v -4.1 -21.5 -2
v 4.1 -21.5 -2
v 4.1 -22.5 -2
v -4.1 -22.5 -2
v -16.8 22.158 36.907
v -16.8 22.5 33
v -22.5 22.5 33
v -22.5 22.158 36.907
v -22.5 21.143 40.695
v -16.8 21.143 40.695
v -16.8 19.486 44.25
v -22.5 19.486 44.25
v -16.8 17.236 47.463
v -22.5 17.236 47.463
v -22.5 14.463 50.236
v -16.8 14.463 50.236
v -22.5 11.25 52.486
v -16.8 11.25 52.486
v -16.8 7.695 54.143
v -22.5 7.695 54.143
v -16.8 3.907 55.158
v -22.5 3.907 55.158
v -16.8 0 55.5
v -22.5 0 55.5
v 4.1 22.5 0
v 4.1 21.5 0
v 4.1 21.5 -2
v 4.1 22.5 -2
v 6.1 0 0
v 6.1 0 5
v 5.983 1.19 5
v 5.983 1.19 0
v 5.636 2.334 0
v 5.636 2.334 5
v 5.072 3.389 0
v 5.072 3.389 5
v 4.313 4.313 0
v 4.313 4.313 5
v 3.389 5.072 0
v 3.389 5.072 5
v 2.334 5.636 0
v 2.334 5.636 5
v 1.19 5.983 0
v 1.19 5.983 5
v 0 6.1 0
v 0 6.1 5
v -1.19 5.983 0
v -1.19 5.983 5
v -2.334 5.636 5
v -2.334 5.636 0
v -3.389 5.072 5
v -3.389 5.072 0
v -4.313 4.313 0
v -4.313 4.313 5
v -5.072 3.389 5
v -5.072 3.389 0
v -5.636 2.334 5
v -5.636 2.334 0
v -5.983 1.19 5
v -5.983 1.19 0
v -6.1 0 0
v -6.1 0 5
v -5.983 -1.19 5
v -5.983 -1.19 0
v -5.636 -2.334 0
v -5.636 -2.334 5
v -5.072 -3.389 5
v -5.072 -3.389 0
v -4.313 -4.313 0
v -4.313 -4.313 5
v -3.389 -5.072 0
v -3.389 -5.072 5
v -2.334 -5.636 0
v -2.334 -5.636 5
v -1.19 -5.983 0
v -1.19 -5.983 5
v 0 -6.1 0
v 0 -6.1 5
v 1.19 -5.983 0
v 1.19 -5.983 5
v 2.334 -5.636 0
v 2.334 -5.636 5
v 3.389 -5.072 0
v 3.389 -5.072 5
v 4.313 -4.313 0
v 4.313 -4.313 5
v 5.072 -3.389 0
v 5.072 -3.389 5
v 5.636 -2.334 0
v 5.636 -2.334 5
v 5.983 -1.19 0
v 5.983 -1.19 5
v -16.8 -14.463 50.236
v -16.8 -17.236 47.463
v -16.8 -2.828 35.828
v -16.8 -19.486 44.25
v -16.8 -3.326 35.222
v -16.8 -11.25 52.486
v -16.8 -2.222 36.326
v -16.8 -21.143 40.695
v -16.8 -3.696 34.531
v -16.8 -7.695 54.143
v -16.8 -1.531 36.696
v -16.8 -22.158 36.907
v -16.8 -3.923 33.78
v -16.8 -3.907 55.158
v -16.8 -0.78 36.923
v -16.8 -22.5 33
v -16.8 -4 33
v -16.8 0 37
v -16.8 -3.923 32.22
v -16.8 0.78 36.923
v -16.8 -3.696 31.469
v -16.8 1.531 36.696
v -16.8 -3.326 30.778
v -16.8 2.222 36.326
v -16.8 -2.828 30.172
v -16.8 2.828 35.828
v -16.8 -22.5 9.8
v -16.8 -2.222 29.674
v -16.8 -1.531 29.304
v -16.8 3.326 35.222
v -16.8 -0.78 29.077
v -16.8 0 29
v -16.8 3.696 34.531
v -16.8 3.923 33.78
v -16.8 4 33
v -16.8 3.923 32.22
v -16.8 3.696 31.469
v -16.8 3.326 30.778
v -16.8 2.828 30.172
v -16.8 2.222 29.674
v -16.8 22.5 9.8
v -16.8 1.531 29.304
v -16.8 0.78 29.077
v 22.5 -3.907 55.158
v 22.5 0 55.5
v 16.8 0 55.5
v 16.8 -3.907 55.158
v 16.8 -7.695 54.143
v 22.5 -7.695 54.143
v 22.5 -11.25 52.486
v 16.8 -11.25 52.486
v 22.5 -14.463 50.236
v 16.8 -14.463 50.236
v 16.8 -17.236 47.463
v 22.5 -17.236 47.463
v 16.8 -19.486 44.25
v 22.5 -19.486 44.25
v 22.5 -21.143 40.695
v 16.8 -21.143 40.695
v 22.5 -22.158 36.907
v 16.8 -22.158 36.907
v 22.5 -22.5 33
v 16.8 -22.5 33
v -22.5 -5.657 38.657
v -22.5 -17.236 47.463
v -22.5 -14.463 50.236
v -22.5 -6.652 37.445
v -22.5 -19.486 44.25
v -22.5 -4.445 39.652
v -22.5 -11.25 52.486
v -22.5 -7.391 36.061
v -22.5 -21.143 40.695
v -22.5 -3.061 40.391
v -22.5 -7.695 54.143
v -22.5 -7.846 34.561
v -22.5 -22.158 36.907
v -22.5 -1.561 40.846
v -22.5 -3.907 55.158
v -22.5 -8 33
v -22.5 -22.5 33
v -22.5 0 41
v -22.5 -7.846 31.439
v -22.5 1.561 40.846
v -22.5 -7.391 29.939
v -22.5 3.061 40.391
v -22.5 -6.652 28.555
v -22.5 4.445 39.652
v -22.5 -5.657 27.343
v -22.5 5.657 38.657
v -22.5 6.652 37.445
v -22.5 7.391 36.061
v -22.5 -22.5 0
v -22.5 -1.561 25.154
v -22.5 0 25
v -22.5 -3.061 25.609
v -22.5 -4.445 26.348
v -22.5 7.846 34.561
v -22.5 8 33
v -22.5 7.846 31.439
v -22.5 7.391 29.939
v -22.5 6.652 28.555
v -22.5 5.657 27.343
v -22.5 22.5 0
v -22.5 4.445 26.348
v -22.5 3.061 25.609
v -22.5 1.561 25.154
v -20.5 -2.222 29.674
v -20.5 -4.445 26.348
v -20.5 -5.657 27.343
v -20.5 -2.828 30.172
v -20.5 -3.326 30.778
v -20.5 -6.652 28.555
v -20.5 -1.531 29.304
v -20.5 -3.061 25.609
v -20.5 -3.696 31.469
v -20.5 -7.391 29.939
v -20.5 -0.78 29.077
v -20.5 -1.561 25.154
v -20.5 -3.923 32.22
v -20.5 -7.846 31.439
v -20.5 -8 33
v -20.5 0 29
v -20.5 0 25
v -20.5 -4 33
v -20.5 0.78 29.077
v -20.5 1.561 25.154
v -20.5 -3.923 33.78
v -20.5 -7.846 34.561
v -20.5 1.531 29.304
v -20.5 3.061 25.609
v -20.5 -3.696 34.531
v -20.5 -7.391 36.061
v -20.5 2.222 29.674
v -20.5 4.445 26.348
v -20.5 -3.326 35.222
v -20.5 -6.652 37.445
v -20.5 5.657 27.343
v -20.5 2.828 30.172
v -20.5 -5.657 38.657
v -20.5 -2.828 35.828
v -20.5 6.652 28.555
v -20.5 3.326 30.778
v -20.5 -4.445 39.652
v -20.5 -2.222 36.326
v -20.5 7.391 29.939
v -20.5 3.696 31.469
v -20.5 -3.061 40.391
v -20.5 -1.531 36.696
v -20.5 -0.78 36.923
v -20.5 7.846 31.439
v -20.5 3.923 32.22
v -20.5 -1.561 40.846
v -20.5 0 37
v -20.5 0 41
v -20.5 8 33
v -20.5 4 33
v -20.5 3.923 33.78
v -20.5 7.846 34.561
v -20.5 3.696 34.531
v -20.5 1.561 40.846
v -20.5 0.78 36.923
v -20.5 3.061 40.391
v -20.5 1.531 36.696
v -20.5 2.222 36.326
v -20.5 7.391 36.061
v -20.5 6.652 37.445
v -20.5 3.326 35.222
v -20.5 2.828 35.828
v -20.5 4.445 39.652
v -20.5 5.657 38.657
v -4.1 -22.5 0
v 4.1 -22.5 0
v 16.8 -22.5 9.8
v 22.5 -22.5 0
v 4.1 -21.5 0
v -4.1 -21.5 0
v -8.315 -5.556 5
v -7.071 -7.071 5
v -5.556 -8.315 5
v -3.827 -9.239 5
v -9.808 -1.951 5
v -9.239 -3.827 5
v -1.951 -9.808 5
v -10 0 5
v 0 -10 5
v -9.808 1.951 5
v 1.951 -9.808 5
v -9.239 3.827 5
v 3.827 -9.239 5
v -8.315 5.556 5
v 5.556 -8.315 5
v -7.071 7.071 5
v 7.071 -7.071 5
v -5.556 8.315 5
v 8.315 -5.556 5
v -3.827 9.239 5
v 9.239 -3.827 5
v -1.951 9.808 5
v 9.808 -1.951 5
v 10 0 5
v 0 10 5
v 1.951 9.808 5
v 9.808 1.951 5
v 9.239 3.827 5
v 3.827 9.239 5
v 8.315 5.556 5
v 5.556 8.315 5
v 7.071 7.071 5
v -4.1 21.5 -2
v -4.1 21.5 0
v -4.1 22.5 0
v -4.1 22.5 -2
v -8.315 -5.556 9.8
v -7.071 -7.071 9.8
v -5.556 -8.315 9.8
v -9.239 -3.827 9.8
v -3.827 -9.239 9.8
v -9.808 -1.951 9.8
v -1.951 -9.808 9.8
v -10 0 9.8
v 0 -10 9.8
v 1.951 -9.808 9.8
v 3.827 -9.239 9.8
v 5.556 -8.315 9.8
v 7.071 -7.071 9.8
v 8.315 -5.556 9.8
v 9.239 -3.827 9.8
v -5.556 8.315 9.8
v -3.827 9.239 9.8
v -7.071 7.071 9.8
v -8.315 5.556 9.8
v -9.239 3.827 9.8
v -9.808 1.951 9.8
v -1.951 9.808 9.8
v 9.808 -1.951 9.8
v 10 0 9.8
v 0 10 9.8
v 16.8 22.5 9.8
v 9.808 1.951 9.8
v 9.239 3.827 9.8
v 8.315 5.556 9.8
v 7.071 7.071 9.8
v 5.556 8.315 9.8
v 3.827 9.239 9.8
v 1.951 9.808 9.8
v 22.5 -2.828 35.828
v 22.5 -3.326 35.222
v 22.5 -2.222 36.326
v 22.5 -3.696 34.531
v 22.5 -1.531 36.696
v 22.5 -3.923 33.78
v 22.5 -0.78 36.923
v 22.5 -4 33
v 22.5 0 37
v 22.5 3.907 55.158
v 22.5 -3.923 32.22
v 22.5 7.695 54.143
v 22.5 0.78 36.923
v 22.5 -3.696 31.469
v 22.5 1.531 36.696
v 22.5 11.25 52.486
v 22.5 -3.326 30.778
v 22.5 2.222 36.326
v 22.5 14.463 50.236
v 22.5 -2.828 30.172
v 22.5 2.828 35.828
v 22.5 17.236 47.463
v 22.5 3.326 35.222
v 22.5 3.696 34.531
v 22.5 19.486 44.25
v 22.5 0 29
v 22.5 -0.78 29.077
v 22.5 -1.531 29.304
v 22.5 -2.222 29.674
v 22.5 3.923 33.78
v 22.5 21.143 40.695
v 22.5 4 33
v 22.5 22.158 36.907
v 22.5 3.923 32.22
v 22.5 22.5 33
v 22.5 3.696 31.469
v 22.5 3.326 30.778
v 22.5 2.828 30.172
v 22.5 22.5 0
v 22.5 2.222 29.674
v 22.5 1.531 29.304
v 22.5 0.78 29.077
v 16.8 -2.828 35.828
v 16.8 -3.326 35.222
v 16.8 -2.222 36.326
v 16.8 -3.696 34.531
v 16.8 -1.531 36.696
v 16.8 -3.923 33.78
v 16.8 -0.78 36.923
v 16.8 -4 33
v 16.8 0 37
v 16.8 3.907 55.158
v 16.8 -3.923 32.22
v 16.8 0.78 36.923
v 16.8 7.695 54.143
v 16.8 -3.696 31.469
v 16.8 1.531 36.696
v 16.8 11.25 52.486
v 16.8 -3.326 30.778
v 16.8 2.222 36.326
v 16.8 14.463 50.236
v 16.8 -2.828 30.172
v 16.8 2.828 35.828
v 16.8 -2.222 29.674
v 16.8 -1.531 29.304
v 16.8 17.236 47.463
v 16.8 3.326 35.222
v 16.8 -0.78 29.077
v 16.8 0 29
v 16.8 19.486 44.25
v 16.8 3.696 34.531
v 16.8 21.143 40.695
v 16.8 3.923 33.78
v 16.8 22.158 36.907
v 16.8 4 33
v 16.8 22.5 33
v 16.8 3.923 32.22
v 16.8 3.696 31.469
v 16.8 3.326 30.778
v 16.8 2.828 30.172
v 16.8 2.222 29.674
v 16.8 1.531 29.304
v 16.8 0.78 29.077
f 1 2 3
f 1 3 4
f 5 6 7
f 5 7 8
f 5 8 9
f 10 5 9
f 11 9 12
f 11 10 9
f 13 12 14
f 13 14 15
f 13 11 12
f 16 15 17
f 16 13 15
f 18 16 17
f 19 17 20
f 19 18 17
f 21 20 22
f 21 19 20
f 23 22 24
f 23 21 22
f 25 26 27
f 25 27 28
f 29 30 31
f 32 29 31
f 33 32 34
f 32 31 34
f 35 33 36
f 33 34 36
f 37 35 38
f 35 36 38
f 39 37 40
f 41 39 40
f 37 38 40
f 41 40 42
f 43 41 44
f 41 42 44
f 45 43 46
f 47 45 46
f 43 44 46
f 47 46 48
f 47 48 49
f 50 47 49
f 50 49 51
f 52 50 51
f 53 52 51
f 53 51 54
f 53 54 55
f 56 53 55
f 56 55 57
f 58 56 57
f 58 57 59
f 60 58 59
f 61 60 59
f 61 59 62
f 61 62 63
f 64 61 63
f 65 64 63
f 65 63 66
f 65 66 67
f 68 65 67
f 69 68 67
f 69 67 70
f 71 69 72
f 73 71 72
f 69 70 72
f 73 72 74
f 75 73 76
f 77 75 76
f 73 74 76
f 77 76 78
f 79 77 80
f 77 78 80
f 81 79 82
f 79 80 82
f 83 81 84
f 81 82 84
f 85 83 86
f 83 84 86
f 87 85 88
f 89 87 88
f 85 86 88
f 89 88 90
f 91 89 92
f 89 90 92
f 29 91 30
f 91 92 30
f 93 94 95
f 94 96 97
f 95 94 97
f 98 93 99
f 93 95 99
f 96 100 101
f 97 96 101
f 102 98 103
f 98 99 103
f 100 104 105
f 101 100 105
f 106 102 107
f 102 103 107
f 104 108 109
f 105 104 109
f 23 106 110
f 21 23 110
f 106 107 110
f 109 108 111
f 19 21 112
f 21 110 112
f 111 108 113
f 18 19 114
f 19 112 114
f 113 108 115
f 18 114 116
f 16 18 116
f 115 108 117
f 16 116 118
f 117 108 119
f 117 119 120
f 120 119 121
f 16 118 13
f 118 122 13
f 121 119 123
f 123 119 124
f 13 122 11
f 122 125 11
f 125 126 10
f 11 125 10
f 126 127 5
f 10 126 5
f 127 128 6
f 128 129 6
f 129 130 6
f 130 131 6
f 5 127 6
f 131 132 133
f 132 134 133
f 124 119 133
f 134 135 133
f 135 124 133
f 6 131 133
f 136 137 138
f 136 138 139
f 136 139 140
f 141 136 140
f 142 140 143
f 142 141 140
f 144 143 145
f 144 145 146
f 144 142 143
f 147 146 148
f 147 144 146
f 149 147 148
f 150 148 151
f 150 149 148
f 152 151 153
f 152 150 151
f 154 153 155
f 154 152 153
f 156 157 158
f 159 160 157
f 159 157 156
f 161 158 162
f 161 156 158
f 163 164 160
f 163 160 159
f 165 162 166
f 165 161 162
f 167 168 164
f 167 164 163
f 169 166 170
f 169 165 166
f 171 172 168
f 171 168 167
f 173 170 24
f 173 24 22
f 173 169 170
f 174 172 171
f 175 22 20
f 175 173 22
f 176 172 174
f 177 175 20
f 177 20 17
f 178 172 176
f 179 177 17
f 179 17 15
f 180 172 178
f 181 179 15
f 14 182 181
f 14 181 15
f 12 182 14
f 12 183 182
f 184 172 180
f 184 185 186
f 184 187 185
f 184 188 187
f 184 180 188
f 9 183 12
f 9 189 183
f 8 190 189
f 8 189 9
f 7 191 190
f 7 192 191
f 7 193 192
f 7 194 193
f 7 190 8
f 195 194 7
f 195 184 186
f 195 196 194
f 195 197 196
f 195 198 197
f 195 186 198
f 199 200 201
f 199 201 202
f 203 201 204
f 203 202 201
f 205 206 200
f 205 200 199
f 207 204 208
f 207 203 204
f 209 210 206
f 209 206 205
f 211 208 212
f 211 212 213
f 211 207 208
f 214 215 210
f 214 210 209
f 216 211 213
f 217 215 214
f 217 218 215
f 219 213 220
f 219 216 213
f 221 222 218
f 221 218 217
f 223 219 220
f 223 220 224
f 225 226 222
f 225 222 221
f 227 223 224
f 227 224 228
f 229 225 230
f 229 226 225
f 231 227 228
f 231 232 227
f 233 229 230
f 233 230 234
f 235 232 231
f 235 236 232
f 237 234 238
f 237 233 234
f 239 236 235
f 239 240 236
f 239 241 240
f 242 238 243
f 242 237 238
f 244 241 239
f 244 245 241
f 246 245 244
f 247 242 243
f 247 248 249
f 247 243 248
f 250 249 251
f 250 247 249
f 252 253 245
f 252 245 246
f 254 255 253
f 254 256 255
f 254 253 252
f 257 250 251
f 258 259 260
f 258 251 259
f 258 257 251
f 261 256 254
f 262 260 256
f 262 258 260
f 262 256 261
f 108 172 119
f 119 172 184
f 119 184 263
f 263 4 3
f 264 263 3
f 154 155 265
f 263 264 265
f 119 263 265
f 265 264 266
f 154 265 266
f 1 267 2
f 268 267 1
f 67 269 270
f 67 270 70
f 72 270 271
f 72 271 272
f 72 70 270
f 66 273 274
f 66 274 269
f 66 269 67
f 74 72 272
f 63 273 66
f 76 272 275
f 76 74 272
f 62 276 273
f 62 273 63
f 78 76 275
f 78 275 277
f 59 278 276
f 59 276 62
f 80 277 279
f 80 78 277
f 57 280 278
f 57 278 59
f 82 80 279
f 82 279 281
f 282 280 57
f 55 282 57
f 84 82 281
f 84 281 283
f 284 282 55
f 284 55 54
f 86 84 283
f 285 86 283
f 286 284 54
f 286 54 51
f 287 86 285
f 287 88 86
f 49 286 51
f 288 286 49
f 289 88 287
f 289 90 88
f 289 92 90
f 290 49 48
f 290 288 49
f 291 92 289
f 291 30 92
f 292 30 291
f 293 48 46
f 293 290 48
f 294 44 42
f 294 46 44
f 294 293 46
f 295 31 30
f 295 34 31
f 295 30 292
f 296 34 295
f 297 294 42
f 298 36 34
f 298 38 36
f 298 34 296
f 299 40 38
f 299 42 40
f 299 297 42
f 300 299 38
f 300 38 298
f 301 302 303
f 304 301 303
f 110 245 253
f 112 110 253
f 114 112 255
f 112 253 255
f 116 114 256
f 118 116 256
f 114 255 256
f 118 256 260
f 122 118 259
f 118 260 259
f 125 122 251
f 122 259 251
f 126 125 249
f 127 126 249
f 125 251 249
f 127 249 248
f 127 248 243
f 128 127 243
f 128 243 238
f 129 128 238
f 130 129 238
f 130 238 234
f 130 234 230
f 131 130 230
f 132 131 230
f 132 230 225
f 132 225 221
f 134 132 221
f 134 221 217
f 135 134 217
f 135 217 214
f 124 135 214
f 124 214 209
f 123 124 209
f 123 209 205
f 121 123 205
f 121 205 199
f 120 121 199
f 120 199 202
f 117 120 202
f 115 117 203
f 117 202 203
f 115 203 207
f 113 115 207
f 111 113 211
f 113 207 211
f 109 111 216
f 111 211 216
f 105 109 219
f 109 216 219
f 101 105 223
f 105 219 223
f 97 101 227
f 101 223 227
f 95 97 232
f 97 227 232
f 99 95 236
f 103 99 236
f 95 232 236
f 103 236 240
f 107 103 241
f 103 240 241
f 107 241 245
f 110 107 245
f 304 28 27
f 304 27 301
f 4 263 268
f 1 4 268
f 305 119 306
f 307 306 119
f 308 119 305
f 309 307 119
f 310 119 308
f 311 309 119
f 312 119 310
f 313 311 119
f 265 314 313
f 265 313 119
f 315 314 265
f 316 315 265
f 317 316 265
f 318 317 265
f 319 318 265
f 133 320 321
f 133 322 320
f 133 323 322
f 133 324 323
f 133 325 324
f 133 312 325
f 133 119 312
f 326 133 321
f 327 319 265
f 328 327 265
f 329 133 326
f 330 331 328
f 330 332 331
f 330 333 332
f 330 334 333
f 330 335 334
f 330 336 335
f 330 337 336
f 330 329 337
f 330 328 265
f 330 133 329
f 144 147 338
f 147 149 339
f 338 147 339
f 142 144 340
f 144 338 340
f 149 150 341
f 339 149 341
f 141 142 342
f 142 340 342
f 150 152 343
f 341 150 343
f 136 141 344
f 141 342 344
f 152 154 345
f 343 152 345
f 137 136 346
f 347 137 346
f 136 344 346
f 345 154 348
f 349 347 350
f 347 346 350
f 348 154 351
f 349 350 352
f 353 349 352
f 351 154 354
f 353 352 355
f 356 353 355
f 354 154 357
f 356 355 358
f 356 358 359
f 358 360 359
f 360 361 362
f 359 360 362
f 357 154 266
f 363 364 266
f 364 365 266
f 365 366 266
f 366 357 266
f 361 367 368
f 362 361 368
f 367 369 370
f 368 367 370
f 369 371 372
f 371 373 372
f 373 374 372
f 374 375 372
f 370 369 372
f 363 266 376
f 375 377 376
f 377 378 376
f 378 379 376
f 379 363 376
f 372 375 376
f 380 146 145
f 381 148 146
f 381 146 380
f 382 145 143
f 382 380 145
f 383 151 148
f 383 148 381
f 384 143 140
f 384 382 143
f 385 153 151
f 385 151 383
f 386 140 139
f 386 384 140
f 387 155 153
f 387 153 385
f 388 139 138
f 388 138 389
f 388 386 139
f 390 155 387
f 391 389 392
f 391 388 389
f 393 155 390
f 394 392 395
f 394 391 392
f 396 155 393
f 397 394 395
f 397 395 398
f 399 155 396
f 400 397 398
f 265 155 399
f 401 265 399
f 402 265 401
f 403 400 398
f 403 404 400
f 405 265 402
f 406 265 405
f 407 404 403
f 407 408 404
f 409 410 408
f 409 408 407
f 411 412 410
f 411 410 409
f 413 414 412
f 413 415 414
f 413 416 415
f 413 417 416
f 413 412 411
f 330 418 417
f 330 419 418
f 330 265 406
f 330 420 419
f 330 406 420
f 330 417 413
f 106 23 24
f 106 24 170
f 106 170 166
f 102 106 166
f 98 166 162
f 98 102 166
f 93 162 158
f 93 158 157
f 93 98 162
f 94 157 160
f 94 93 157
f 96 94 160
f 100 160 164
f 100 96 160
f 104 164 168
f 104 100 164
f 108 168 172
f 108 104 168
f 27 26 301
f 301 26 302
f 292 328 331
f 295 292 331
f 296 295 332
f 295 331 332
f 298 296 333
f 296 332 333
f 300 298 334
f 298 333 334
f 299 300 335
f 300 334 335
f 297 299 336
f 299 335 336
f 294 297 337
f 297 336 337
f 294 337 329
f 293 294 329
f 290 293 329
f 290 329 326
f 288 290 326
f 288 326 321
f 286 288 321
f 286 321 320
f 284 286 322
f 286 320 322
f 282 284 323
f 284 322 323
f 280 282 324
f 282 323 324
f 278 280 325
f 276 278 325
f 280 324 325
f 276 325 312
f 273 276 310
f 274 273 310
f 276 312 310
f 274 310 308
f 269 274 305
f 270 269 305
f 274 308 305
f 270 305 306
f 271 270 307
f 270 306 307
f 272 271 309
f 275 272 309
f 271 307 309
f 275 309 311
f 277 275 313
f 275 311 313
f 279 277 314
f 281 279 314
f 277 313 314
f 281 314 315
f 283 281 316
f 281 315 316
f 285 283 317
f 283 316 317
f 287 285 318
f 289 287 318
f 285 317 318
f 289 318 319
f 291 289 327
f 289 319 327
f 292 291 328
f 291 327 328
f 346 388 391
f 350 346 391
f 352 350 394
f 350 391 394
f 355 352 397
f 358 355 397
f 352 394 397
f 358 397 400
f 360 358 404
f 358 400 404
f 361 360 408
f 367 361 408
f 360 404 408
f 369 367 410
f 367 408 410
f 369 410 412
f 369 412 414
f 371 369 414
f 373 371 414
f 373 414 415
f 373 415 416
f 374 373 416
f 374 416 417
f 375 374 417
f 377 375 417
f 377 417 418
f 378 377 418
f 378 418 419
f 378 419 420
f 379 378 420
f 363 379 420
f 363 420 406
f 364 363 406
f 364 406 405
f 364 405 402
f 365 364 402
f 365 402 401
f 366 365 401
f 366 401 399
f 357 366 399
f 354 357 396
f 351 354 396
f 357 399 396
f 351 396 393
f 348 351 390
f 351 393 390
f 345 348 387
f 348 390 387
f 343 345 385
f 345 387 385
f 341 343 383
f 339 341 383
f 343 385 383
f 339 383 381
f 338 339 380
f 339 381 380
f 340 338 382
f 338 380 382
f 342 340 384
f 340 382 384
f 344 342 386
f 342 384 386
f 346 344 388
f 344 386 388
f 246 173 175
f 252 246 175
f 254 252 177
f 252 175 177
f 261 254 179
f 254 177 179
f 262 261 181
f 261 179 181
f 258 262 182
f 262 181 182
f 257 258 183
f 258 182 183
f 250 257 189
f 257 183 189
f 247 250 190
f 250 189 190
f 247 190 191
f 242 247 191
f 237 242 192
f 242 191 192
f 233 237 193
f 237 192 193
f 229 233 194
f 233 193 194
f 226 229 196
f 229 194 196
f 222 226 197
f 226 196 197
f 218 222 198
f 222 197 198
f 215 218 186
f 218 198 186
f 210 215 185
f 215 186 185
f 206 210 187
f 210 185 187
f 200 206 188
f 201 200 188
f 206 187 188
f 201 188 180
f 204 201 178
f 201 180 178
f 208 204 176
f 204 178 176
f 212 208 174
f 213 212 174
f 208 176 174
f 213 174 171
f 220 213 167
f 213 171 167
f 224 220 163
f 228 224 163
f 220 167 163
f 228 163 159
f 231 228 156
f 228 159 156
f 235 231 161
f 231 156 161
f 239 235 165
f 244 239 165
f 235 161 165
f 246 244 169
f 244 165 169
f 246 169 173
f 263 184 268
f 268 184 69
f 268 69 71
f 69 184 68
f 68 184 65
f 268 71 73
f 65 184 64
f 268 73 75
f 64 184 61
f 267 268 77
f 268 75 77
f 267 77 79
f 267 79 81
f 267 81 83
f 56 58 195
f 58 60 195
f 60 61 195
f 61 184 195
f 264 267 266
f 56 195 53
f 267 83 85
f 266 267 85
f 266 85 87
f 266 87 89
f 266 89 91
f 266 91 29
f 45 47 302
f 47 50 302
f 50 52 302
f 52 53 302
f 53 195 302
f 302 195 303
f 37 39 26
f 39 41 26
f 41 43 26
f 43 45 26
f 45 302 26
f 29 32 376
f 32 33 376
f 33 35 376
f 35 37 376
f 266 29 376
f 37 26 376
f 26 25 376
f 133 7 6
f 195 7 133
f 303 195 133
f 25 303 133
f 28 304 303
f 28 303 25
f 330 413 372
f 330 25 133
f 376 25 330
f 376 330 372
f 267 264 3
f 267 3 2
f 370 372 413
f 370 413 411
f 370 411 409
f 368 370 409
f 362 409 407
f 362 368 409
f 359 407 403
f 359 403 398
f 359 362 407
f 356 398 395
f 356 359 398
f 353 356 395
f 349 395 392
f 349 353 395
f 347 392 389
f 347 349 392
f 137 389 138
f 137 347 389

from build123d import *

# Parameters (mm, degrees)
SKETCH_1_W          = 45
SKETCH_1_H          = 45
EXTRUDE_1_DEPTH     = 9.8
SKETCH_2_W          = 5.7
SKETCH_2_H          = 45
EXTRUDE_2_DEPTH     = 45.7
CUT_EXTRUDE_START   = -45
CUT_EXTRUDE_2_DEPTH = 45
SKETCH_4_R          = 4
CUT_EXTRUDE_3_DEPTH = 75.909945935
SKETCH_5_R          = 8
CUT_EXTRUDE_4_DEPTH = 2
SKETCH_6_R          = 6.1
CUT_EXTRUDE_5_DEPTH = 56.686533381
SKETCH_7_W          = 8.2
SKETCH_7_H          = 1
EXTRUDE_3_DEPTH     = 2
SKETCH_8_R          = 10
CUT_EXTRUDE_6_DEPTH = 4.8


# Read off the part's stored shape, not the designer's step: 切除-拉伸2
with BuildPart() as part:
    # 草图1 → 凸台-拉伸1 (new body)
    with BuildSketch(Plane.XY):
        Rectangle(SKETCH_1_W, SKETCH_1_H)
    extrude(amount=EXTRUDE_1_DEPTH)

    # 草图2 → 凸台-拉伸2 (add)
    with BuildSketch(Plane.XY.offset(9.8)):
        with Locations((-19.65, 0)):
            Rectangle(SKETCH_2_W, SKETCH_2_H)
        with Locations((19.65, 0)):
            Rectangle(SKETCH_2_W, SKETCH_2_H)
    extrude(amount=EXTRUDE_2_DEPTH)

    # 切除-拉伸2 outline → 切除-拉伸2 (cut)
    with BuildSketch(Plane.ZY.offset(22.5).offset(CUT_EXTRUDE_START)):
        with BuildLine():
            Line((55.5, 22.5), (33, 22.5))
            ThreePointArc((33, 22.5), (48.909902577, 15.909902577), (55.5, 0))
            Line((55.5, 0), (55.5, 22.5))
        make_face()
        with BuildLine():
            Line((55.5, -22.5), (55.5, 0))
            ThreePointArc((55.5, 0), (48.909902577, -15.909902577), (33, -22.5))
            Line((33, -22.5), (55.5, -22.5))
        make_face()
    extrude(amount=CUT_EXTRUDE_2_DEPTH, mode=Mode.SUBTRACT)

    # 草图4 → 切除-拉伸3 (cut, through all)
    with BuildSketch(Plane.ZY.offset(22.5)):
        with Locations((33, 0)):
            Circle(SKETCH_4_R)
    extrude(amount=-CUT_EXTRUDE_3_DEPTH, mode=Mode.SUBTRACT)

    # 草图5 → 切除-拉伸4 (cut)
    with BuildSketch(Plane.ZY.offset(22.5)):
        with Locations((33, 0)):
            Circle(SKETCH_5_R)
    extrude(amount=-CUT_EXTRUDE_4_DEPTH, mode=Mode.SUBTRACT)

    # 草图6 → 切除-拉伸5 (cut, through all)
    with BuildSketch(Plane.XY.offset(9.8)):
        Circle(SKETCH_6_R)
    extrude(amount=-CUT_EXTRUDE_5_DEPTH, mode=Mode.SUBTRACT)

    # 草图7 → 凸台-拉伸3 (add)
    with BuildSketch(Plane(origin=(0, 0, 0), x_dir=(-1, 0, 0), z_dir=(0, 0, -1))):
        with Locations((0, 22)):
            Rectangle(SKETCH_7_W, SKETCH_7_H)
        with Locations((0, -22)):
            Rectangle(SKETCH_7_W, SKETCH_7_H)
    extrude(amount=EXTRUDE_3_DEPTH)

    # 草图8 → 切除-拉伸6 (cut)
    with BuildSketch(Plane.XY.offset(9.8)):
        Circle(SKETCH_8_R)
    extrude(amount=-CUT_EXTRUDE_6_DEPTH, mode=Mode.SUBTRACT)


solid = part.part
